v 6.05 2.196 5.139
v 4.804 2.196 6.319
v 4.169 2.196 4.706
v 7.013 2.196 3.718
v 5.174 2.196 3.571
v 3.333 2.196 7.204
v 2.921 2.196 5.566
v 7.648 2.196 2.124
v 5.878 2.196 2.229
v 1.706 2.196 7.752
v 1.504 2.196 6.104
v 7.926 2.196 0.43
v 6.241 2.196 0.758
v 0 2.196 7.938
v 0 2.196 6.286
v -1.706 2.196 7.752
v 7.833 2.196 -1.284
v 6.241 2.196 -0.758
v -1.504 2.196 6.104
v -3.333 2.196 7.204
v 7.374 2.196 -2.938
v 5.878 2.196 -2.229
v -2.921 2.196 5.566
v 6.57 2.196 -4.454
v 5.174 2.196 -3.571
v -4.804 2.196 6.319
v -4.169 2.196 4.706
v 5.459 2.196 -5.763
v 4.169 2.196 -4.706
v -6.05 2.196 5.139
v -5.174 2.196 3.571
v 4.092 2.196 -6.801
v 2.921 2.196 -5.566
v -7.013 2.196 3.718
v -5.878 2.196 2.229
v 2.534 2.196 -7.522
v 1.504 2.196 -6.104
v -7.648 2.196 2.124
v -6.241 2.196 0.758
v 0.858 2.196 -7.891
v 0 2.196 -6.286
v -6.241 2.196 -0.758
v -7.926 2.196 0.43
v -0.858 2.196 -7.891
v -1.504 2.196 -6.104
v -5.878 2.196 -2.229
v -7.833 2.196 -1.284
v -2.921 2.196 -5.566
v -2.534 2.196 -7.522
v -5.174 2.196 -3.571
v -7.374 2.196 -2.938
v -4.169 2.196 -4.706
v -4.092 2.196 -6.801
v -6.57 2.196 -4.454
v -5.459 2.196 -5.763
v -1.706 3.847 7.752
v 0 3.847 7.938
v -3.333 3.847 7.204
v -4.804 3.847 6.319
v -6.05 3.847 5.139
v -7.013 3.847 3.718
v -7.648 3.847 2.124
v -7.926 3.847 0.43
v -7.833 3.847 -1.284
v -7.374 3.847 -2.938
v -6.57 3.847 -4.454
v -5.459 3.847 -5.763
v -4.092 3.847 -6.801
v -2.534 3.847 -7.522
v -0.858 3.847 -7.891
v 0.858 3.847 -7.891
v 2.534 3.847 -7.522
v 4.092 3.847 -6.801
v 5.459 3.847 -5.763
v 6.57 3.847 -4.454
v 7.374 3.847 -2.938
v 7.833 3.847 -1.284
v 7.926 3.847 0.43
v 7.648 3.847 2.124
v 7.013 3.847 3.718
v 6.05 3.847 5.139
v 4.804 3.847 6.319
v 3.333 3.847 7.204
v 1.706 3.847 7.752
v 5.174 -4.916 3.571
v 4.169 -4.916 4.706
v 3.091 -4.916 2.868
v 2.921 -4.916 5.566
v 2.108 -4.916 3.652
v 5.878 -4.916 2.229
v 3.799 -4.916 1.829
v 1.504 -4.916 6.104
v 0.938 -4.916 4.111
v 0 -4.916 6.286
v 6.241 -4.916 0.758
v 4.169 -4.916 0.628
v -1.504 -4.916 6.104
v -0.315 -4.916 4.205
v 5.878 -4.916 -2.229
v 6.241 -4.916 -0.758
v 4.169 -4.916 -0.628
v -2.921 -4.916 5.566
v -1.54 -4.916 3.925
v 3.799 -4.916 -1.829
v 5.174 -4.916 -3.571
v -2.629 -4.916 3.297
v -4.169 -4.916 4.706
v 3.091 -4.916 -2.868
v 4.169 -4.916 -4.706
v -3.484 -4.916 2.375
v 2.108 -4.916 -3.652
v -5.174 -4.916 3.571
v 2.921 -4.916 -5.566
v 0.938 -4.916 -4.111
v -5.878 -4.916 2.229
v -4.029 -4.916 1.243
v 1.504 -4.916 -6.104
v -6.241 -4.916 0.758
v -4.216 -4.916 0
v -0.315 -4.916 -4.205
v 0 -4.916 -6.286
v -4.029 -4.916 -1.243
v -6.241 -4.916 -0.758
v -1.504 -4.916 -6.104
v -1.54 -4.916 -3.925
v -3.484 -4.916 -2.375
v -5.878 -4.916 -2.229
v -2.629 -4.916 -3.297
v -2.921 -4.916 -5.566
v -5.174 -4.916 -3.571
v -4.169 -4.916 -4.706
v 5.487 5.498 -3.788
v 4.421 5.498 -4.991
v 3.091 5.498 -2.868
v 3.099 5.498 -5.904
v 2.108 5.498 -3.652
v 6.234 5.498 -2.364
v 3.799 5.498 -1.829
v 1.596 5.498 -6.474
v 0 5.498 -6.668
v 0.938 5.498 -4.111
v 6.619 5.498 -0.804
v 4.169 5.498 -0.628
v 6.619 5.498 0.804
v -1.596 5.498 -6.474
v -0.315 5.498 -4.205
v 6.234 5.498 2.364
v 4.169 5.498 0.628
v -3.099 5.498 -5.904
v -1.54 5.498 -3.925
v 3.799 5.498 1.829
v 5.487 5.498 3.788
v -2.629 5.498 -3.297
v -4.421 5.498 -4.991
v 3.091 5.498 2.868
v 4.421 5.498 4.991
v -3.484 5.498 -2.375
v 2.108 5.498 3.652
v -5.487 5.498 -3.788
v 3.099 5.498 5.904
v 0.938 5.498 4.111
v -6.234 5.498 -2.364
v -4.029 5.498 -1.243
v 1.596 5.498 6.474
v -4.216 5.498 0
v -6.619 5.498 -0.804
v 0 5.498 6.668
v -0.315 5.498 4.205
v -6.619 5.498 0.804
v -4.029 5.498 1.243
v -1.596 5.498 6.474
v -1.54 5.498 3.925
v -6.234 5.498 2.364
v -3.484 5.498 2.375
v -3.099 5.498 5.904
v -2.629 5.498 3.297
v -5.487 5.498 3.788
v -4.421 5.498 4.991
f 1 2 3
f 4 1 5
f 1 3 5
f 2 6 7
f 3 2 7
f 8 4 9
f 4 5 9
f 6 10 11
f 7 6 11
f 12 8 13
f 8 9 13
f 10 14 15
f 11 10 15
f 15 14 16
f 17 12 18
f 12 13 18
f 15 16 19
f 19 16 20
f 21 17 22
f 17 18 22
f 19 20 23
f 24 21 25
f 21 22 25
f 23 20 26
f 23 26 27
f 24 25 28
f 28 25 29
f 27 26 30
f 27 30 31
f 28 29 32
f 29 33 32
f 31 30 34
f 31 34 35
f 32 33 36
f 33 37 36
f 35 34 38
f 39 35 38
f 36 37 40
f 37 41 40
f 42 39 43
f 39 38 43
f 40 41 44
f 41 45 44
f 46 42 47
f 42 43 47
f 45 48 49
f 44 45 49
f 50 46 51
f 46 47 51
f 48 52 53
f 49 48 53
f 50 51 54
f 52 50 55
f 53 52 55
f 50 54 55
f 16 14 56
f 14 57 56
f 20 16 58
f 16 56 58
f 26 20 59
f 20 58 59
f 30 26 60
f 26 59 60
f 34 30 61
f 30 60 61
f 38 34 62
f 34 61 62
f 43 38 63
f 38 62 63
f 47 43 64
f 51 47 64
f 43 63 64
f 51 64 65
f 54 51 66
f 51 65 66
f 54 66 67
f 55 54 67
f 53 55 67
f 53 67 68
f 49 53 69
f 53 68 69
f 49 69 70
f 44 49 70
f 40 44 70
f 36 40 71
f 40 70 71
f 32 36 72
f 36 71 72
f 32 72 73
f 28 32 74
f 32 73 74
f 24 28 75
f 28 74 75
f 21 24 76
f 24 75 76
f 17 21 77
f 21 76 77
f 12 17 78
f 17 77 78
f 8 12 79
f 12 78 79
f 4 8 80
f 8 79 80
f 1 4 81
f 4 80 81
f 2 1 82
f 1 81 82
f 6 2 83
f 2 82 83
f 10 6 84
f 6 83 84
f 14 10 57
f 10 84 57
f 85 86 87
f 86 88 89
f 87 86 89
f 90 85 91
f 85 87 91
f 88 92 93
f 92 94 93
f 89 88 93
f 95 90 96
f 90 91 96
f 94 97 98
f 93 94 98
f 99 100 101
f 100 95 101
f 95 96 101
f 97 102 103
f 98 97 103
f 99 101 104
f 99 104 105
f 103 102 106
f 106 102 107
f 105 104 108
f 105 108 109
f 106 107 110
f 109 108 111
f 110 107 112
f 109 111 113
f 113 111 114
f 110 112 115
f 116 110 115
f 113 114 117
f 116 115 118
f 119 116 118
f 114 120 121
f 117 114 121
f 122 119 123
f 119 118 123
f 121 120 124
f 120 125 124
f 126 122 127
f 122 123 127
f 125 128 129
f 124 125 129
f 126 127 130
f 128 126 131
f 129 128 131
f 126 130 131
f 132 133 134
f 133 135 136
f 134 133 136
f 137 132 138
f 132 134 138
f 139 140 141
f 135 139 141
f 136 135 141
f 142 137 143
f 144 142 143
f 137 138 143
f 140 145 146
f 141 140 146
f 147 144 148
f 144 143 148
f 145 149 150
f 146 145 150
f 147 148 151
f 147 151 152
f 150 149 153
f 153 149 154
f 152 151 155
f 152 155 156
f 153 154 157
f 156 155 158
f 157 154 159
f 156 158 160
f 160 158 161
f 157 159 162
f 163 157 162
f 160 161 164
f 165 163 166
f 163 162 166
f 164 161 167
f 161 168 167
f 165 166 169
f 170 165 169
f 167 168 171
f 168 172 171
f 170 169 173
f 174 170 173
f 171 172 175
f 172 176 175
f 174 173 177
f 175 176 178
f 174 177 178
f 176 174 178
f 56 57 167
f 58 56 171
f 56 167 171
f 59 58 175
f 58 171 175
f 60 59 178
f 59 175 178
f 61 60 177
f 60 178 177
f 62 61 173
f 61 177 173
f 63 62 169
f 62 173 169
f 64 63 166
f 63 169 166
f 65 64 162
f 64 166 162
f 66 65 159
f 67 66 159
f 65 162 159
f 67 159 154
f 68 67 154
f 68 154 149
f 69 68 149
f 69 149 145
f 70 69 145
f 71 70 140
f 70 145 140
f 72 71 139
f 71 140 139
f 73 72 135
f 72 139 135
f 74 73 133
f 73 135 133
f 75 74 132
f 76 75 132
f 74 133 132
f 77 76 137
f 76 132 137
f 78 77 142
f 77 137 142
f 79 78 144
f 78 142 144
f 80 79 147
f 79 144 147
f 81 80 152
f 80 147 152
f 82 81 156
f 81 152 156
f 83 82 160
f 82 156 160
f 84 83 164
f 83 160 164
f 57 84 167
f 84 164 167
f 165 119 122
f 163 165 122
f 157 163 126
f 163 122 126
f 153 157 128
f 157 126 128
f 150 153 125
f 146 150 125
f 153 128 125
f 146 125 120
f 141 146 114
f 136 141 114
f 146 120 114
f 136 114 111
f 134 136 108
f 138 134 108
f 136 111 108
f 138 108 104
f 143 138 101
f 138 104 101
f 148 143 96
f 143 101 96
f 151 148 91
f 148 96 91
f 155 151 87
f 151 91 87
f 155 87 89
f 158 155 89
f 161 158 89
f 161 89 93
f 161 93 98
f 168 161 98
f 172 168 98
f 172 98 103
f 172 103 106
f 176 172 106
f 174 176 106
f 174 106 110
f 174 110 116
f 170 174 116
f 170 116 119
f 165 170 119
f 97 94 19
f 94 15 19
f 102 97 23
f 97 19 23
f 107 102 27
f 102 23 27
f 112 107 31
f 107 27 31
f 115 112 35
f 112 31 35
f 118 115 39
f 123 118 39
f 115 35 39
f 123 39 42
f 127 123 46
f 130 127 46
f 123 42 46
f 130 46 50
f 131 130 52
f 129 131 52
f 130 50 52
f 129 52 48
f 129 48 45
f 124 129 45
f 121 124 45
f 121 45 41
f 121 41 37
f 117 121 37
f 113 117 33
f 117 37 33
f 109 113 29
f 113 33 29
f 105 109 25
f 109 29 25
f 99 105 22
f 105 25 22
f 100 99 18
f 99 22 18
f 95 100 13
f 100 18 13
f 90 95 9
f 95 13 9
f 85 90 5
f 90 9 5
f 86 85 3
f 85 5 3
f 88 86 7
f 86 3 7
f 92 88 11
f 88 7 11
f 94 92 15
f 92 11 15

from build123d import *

# Parameters (mm, degrees)
F_3_8_24_TAPPED_HOLE1_D = 8.4328


with BuildPart() as part:
    # Sketch1 → Revolve1 (revolve)
    with BuildSketch(Plane.XY, mode=Mode.PRIVATE) as revolve1_sk:
        Polygon((0, 5.498310654), (0, -4.915689346), (6.2865, -4.915689346), (6.2865, 2.196310654), (7.9375, 2.196310654), (7.9375, 3.847310654), (6.6675, 5.498310654), align=None)
    revolve(revolve1_sk.sketch.rotate(Axis((0, 5.498310654, 0), (0, -1, 0)), 90), axis=Axis((0, 5.498310654, 0), (0, -1, 0)))

    # 3/8-24 Tapped Hole1 (through all)
    with Locations(Plane(origin=(0, 5.498310654, 0), x_dir=(1, 0, 0), z_dir=(0, 1, 0))):
        with Locations((0, 0)):
            Hole(F_3_8_24_TAPPED_HOLE1_D / 2)


solid = part.part
